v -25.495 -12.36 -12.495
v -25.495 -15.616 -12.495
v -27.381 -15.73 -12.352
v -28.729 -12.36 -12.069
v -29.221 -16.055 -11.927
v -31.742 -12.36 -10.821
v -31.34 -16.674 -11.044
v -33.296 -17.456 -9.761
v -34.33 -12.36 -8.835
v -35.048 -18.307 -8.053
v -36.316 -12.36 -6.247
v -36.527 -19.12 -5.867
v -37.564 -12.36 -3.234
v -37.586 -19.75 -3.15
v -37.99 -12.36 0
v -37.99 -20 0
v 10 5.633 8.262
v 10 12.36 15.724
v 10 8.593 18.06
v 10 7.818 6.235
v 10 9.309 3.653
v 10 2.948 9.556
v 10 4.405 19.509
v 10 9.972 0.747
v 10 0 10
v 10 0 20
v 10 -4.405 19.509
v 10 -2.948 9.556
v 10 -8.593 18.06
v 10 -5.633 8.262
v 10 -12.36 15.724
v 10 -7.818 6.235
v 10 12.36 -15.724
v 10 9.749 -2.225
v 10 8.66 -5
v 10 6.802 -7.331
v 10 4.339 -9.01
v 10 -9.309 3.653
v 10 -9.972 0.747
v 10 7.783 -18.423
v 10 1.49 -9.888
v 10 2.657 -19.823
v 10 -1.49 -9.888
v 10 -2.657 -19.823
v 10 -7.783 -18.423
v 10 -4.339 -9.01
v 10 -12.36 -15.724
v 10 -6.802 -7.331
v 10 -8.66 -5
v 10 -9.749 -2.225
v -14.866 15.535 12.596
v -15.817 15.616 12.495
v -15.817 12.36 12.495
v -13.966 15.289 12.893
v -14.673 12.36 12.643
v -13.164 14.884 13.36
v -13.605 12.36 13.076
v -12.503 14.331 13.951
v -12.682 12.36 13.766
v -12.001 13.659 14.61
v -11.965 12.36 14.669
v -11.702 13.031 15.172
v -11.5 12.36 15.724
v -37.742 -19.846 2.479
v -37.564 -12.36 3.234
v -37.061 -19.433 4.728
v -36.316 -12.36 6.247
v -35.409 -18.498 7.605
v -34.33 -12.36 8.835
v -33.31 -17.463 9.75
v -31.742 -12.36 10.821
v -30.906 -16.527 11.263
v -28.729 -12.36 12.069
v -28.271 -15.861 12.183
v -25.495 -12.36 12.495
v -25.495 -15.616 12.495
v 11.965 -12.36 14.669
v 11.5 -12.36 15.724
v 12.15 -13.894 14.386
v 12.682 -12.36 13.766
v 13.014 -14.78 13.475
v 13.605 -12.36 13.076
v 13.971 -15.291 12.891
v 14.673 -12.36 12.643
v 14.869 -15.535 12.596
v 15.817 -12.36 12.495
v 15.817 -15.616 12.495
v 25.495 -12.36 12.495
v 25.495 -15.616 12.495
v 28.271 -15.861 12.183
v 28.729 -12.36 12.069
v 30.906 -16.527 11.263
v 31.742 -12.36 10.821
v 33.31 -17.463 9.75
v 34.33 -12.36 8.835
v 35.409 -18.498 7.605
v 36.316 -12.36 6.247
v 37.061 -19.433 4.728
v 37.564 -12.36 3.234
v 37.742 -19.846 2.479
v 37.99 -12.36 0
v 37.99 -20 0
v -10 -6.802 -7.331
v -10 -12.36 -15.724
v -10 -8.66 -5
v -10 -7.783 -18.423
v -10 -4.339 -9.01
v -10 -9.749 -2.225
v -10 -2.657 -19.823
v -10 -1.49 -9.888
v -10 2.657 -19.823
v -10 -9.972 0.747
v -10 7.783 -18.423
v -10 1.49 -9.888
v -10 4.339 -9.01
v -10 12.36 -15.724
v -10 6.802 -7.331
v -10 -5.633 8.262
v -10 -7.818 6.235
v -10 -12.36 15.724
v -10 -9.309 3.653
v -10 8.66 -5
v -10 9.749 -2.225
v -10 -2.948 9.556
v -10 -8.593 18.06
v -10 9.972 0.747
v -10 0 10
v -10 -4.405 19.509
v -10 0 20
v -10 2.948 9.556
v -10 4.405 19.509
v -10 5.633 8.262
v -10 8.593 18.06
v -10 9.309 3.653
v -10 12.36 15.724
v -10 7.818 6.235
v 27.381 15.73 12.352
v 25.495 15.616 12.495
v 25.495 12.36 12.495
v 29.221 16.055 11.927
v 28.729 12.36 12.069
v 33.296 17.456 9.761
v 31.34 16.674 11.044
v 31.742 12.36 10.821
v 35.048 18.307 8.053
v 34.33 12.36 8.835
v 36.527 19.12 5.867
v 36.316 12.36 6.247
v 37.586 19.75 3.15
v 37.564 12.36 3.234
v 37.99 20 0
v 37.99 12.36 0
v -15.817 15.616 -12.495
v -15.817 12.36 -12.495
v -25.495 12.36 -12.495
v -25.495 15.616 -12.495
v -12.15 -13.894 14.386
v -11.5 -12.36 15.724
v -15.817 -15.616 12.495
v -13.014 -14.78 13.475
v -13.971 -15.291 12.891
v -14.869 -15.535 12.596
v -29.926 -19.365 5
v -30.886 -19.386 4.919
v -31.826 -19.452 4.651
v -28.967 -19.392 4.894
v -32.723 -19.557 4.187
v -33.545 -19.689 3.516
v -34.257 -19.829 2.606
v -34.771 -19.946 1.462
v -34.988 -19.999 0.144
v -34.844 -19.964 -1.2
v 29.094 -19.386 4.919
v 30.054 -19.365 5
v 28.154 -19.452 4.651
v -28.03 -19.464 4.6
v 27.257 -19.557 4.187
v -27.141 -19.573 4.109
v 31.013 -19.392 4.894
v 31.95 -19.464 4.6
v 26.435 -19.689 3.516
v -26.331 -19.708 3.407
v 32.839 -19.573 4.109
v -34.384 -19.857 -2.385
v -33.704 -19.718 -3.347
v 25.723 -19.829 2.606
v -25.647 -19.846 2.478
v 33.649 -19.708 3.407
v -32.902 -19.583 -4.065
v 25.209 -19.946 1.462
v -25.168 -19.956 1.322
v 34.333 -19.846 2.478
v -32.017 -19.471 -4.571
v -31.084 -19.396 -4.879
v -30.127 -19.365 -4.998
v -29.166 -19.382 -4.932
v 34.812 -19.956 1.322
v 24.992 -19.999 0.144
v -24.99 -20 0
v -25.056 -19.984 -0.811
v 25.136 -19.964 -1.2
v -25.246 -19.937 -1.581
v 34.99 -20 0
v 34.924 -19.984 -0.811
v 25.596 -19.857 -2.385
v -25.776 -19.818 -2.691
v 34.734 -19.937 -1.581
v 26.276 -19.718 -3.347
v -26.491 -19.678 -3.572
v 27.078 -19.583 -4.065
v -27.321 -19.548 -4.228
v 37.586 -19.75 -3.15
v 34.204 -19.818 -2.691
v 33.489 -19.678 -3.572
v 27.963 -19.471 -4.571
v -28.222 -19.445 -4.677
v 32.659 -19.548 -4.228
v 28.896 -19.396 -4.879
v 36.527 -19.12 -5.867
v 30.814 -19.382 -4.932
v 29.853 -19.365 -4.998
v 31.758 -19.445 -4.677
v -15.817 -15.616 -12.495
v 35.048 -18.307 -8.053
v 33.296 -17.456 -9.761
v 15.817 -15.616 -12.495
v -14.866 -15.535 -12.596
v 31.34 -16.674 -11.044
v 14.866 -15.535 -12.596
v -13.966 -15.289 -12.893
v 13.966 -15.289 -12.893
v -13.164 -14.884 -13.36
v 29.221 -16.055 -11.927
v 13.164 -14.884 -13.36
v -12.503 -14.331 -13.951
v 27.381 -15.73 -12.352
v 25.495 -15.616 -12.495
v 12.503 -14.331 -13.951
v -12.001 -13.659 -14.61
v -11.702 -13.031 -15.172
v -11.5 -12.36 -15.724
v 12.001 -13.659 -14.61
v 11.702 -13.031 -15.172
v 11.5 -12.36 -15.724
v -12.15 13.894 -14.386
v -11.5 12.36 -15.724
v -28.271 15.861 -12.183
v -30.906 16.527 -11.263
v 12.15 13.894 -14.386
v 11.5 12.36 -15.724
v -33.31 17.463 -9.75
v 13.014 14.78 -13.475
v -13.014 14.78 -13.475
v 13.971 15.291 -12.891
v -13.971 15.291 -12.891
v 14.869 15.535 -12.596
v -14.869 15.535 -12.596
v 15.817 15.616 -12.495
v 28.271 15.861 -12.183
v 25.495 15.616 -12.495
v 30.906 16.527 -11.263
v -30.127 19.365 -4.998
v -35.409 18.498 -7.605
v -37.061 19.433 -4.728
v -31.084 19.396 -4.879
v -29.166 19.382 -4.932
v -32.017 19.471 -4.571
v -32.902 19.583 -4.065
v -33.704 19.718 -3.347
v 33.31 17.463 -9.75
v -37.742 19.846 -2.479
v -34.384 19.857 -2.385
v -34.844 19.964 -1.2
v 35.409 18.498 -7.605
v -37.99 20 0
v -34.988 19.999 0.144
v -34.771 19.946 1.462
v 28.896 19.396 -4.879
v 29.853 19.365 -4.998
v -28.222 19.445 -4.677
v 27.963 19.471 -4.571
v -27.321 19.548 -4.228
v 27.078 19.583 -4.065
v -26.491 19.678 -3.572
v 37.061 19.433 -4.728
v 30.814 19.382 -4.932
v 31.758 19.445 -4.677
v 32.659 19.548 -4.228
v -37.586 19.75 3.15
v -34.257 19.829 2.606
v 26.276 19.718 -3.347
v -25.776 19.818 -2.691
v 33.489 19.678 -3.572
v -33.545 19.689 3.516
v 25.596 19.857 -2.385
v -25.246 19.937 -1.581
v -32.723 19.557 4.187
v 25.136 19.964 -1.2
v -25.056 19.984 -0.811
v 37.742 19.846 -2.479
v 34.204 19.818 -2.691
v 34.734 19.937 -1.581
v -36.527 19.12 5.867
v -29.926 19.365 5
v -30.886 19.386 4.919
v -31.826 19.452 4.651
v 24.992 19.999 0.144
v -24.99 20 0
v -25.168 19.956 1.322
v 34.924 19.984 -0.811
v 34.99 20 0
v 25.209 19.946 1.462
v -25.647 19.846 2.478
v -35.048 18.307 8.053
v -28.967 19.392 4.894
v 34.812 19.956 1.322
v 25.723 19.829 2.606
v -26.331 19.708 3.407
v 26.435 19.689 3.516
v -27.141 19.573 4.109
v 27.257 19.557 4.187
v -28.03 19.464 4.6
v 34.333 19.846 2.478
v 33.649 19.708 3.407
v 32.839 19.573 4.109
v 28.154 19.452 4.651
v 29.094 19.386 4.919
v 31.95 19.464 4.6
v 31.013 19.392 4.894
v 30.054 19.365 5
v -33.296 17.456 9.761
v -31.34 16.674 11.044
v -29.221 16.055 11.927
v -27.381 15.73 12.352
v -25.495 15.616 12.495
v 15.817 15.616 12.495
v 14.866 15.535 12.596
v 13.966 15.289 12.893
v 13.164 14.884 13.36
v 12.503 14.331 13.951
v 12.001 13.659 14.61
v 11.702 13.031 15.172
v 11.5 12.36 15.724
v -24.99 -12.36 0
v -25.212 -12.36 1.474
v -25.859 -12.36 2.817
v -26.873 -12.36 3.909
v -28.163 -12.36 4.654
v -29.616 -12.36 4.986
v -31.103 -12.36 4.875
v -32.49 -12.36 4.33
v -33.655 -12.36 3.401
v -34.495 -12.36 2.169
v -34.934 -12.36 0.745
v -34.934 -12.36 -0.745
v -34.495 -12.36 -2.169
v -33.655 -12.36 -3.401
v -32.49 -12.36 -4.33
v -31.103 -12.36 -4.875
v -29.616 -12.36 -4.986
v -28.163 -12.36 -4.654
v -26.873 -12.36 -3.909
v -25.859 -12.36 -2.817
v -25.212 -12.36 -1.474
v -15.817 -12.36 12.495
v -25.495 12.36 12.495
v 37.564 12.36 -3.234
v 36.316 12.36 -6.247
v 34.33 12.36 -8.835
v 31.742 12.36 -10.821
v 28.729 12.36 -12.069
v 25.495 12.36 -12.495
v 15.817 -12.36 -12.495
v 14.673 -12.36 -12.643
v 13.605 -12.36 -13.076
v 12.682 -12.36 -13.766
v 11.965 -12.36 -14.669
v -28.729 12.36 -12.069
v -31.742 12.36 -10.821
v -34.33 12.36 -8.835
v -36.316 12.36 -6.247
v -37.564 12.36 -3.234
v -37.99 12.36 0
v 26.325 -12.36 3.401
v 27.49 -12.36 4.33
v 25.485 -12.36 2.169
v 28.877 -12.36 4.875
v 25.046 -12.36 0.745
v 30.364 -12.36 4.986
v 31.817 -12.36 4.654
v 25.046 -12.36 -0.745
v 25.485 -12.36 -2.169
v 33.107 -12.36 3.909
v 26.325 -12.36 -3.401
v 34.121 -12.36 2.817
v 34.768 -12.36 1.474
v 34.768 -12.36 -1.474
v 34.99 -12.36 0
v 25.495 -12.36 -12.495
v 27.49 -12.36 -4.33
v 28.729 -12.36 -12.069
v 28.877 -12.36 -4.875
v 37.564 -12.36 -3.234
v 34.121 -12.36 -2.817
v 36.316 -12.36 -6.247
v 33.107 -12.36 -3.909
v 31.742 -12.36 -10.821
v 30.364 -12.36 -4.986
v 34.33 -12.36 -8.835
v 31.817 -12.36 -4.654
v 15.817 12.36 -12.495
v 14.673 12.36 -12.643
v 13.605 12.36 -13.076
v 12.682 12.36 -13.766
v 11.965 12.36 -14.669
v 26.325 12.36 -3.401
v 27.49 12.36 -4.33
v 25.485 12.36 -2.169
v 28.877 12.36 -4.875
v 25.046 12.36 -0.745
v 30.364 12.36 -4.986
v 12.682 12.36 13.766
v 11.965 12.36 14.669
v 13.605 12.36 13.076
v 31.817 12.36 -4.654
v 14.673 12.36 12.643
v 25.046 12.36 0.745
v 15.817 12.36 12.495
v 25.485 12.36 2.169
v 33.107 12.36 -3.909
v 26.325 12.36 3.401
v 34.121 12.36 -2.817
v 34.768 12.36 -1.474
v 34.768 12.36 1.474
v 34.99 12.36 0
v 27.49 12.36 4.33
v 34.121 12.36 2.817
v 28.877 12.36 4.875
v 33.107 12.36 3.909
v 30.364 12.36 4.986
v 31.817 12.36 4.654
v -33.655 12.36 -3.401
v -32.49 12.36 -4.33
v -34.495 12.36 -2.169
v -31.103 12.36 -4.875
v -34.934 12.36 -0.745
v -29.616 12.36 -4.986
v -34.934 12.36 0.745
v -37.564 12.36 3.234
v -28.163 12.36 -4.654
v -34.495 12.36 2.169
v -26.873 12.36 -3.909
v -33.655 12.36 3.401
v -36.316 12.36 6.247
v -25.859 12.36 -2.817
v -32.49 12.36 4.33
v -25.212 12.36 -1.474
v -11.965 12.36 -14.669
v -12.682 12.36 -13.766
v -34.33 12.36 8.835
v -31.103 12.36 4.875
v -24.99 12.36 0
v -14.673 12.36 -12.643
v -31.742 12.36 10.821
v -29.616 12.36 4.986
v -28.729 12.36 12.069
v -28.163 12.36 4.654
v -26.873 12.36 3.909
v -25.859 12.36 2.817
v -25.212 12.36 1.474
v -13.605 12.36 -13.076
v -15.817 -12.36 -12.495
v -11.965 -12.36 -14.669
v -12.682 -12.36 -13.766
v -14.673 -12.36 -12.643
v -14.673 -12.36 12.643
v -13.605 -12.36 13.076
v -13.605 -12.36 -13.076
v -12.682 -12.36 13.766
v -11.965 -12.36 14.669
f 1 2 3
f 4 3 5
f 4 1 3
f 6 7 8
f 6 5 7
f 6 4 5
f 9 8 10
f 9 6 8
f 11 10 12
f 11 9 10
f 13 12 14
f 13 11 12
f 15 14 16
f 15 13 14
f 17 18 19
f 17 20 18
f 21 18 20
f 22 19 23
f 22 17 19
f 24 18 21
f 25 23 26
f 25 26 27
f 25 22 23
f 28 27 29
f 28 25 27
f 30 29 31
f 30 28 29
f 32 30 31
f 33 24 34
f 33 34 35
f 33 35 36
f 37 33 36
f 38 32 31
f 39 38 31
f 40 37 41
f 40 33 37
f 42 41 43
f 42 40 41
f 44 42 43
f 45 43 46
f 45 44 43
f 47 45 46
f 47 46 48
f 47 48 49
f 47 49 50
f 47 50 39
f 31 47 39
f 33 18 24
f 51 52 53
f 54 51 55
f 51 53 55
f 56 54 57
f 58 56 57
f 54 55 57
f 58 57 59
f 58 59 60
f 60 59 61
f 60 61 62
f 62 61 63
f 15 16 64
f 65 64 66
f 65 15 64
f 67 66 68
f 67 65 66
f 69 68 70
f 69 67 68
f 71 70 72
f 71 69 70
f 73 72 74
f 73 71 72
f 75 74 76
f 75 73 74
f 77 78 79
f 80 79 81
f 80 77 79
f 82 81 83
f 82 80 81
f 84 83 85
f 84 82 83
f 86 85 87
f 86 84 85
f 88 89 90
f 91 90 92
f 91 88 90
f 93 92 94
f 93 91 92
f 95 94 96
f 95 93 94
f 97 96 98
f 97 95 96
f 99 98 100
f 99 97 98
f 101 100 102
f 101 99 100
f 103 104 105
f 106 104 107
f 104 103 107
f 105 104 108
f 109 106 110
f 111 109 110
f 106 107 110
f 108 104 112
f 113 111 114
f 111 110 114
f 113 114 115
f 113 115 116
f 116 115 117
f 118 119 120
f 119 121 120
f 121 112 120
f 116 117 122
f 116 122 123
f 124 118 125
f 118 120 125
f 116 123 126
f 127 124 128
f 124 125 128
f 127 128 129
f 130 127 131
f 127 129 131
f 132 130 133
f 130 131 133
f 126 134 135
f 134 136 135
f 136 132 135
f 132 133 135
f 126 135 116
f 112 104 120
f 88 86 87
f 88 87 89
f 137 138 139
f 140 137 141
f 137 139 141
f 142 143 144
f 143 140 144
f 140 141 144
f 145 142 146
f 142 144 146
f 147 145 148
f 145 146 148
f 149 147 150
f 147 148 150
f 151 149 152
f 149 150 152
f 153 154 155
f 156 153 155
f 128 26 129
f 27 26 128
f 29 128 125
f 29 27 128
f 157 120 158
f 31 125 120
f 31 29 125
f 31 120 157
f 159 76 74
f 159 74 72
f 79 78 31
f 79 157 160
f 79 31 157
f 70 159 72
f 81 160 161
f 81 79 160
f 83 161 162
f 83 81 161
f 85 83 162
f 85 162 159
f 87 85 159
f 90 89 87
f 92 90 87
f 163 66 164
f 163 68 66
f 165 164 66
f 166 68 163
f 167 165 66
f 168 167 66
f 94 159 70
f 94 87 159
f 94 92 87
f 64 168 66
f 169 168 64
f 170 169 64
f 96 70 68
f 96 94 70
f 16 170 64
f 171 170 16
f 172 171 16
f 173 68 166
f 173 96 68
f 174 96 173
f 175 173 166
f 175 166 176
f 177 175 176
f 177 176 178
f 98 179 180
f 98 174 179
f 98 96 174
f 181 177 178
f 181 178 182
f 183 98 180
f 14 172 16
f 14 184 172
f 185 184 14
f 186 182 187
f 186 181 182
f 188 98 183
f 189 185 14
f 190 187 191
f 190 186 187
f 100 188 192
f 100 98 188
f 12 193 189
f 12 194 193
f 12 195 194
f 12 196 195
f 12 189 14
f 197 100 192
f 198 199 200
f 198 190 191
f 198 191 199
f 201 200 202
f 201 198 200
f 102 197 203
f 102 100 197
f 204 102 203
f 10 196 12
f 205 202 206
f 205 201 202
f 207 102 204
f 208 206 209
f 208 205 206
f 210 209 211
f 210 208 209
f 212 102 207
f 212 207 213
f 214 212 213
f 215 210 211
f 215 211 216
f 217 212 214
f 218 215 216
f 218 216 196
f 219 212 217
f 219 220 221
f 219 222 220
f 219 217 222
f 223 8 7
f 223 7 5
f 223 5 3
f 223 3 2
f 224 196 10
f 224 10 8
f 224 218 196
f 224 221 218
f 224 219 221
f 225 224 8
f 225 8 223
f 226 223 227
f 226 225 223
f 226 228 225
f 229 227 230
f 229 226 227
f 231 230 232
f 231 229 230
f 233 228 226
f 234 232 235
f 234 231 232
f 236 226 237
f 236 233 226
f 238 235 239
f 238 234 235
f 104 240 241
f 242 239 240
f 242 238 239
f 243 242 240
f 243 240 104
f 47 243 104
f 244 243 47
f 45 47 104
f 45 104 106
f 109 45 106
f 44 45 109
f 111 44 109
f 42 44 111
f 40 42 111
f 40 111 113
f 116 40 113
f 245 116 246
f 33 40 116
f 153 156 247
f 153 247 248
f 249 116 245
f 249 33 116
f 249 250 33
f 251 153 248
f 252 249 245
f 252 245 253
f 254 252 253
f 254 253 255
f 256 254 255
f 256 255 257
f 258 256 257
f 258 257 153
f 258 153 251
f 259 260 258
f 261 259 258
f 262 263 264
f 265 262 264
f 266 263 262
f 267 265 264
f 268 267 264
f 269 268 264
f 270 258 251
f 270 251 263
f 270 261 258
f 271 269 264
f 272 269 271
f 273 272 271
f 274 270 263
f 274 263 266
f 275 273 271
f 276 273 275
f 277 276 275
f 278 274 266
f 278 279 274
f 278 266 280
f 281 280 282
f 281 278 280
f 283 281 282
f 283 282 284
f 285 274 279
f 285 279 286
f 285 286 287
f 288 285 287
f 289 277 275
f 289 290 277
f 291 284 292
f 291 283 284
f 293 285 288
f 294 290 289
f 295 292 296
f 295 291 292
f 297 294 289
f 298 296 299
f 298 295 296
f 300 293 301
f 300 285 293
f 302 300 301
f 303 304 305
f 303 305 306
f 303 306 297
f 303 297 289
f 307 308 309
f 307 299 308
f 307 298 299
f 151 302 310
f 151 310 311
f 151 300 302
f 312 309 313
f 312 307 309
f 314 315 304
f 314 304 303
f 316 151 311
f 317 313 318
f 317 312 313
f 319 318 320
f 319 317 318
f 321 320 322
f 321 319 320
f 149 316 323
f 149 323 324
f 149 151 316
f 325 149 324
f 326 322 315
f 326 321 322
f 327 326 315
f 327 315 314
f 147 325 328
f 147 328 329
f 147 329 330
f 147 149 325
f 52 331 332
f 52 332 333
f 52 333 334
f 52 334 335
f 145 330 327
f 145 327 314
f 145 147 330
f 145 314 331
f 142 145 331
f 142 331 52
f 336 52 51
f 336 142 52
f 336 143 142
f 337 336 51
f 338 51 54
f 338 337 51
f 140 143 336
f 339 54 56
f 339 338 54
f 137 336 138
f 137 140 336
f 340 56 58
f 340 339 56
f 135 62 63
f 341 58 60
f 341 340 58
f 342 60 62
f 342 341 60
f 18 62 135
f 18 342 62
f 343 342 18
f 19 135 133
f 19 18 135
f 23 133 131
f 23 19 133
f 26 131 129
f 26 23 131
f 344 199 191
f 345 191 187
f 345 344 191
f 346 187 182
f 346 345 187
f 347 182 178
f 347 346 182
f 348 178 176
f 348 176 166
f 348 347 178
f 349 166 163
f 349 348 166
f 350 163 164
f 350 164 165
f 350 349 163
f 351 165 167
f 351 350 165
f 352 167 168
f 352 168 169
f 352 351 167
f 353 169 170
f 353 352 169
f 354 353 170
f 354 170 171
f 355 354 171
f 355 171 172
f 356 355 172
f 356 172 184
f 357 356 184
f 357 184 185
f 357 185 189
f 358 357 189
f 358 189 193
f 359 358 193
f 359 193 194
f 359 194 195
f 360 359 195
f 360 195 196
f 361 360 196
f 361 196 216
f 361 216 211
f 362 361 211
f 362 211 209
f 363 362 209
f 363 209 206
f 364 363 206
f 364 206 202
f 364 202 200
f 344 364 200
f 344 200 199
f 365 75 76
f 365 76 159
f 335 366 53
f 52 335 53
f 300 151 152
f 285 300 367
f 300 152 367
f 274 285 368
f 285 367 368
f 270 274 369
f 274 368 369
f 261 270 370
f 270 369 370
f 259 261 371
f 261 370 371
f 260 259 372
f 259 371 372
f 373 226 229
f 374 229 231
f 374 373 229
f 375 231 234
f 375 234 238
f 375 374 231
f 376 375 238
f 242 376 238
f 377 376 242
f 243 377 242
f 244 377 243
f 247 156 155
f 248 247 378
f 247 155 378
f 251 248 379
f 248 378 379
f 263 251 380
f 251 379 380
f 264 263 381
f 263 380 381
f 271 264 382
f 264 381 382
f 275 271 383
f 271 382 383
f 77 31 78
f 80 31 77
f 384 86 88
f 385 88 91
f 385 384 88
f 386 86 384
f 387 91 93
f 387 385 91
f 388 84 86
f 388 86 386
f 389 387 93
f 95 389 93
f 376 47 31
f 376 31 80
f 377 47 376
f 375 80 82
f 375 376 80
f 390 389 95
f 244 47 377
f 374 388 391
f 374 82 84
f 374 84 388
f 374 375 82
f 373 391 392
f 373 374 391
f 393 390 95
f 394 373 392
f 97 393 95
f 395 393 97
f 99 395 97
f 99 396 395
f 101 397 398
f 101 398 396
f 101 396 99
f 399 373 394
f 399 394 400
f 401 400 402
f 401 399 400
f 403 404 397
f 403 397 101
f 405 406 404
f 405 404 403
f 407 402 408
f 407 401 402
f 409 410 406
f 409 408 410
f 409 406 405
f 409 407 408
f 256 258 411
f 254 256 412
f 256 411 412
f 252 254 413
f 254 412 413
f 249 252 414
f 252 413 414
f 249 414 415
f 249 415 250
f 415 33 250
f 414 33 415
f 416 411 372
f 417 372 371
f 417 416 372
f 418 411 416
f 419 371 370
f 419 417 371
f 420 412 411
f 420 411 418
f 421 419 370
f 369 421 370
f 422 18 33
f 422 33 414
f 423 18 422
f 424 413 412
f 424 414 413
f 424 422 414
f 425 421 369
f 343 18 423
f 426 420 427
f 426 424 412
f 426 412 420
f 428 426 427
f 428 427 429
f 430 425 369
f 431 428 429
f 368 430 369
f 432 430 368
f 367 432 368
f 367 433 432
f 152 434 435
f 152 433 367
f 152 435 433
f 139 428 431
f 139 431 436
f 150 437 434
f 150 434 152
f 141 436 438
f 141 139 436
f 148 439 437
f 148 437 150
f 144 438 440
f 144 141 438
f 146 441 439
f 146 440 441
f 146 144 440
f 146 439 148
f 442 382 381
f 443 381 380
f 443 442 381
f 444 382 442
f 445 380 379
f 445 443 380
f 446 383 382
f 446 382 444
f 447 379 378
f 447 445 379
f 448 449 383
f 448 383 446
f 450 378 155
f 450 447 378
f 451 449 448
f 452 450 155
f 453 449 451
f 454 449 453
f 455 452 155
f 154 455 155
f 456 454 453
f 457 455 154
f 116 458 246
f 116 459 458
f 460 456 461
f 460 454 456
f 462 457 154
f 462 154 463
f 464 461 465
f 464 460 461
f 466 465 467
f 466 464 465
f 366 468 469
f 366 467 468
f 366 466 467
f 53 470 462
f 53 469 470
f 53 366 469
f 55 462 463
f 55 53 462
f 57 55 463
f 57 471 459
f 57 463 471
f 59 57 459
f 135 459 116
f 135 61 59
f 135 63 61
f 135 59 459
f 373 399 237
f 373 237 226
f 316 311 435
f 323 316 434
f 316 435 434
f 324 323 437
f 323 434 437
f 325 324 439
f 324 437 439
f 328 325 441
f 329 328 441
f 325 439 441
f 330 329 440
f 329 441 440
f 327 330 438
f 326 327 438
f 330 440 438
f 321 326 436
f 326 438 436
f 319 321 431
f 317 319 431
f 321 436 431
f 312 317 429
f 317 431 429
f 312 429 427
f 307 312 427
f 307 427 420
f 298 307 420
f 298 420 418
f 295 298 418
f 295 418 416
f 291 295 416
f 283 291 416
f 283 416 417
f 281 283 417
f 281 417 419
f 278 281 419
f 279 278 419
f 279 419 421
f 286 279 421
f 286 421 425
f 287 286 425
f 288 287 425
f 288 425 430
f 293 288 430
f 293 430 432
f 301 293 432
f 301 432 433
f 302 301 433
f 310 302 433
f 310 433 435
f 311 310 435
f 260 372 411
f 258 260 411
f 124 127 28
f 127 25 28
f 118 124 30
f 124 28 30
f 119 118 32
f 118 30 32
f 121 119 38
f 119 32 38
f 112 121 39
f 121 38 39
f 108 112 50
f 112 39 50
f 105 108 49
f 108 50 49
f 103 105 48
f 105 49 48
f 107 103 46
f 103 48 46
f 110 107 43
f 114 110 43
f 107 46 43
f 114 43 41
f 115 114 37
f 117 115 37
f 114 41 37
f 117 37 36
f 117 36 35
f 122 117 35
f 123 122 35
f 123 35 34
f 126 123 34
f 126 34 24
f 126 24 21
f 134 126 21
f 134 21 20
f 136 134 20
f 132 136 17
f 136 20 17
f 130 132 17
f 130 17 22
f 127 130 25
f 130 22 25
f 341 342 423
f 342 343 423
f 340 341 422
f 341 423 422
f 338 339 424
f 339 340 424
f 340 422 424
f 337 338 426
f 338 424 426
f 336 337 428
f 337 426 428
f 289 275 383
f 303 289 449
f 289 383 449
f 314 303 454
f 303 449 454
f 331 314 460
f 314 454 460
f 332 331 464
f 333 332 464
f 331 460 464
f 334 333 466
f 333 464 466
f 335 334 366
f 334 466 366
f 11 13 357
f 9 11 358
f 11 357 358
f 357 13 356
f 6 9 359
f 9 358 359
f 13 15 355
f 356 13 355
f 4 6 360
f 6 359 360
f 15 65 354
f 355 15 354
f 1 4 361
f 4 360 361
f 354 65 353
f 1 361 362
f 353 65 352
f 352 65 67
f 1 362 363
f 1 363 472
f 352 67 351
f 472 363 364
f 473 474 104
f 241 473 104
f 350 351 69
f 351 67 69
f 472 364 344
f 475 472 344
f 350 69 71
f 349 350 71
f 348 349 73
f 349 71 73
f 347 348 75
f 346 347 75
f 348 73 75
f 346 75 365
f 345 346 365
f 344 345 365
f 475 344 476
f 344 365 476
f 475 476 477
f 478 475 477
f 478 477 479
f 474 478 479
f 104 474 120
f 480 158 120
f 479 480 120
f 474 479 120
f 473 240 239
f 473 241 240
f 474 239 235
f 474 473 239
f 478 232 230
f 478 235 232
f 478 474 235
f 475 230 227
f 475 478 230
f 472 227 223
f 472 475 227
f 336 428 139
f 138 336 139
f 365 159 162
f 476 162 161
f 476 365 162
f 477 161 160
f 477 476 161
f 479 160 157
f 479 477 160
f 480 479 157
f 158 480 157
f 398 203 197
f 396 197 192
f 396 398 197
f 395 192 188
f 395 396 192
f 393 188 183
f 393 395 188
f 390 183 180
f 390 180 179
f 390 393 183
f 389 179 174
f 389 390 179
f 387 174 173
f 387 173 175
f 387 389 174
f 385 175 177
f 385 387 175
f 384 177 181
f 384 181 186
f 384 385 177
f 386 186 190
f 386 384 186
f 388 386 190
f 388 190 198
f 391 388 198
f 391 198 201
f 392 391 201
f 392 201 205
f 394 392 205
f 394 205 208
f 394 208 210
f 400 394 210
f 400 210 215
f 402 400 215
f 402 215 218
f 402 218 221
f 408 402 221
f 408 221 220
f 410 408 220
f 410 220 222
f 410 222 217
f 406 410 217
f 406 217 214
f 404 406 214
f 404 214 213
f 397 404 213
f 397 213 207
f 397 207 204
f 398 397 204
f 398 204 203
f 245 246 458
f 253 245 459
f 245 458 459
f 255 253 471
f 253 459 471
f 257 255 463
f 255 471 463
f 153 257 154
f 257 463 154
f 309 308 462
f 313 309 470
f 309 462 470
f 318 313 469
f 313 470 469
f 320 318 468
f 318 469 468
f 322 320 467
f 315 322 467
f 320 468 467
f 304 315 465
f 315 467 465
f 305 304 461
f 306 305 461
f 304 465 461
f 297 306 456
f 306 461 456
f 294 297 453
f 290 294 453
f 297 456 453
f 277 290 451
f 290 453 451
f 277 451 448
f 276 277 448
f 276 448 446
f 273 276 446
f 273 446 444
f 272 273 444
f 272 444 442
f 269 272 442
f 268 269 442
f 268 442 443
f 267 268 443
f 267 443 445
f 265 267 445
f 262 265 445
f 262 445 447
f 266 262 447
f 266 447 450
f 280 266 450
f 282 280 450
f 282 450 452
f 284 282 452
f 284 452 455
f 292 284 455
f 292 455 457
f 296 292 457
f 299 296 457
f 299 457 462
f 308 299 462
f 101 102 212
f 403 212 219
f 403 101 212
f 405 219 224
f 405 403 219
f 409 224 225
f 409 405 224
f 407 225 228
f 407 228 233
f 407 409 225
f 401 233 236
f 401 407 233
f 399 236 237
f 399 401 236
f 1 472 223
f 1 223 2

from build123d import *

# Parameters (mm, degrees)
F0_W          = 75.98
F0_H          = 10
F2_W          = 27.99
F2_H          = 12.36
F3_DEPTH      = 20.001
F3_DEPTH_BACK = 20.001
F4_R          = 5
F5_DEPTH      = 20.001
F5_DEPTH_BACK = 20.001


with BuildPart() as f1:
    # F0 (on Front) → F1 (revolve)
    with BuildSketch(Plane.XZ):
        with Locations((0, 15)):
            Rectangle(F0_W, F0_H)
    revolve(axis=Axis((-1.2122914195, 0, 0), (1, 0, 0)))

    # F2 (on Top) → F3 (cut, two sides)
    with BuildSketch(Plane.XY) as f3_sk:
        with Locations((23.995, 6.18)):
            Rectangle(F2_W, F2_H)
        with Locations((23.995, -6.18)):
            Rectangle(F2_W, F2_H)
        with Locations((-23.995, 6.18)):
            Rectangle(F2_W, F2_H)
        with Locations((-23.995, -6.18)):
            Rectangle(F2_W, F2_H)
    extrude(amount=-F3_DEPTH, mode=Mode.SUBTRACT)
    extrude(f3_sk.sketch, amount=F3_DEPTH_BACK, mode=Mode.SUBTRACT)

    # F4 (on Front) → F5 (cut, two sides)
    with BuildSketch(Plane.XZ) as f5_sk:
        with BuildLine():
            Line((-37.99, 15.7235619374), (-37.99, 0))
            ThreePointArc((-37.99, 0), (-34.3302992309, 8.8352992309), (-25.495, 12.495))
            Line((-25.495, 12.495), (-15.8166474553, 12.495))
            ThreePointArc((-15.8166474553, 12.495), (-13.1214175283, 13.3914273782), (-11.5, 15.7235619374))
            Line((-11.5, 15.7235619374), (-37.99, 15.7235619374))
        make_face()
        with BuildLine():
            ThreePointArc((-25.495, -12.495), (-34.3302992309, -8.8352992309), (-37.99, 0))
            Line((-37.99, 0), (-37.99, -15.8999282867))
            Line((-37.99, -15.8999282867), (-11.5, -15.7235619374))
            ThreePointArc((-11.5, -15.7235619374), (-13.1214175283, -13.3914273782), (-15.8166474553, -12.495))
            Line((-15.8166474553, -12.495), (-25.495, -12.495))
        make_face()
        with Locations((-29.99, 0)):
            Circle(F4_R)
        with Locations((29.99, 0)):
            Circle(F4_R)
        with BuildLine():
            Line((37.99, -15.8999282867), (37.99, 0))
            ThreePointArc((37.99, 0), (34.3302992309, -8.8352992309), (25.495, -12.495))
            Line((25.495, -12.495), (15.8166474553, -12.495))
            ThreePointArc((15.8166474553, -12.495), (13.1214175283, -13.3914273782), (11.5, -15.7235619374))
            Line((11.5, -15.7235619374), (37.99, -15.8999282867))
        make_face()
        with BuildLine():
            Line((37.99, 15.7235619374), (11.5, 15.7235619374))
            ThreePointArc((11.5, 15.7235619374), (13.1214175283, 13.3914273782), (15.8166474553, 12.495))
            Line((15.8166474553, 12.495), (25.495, 12.495))
            ThreePointArc((25.495, 12.495), (34.3302992309, 8.8352992309), (37.99, 0))
            Line((37.99, 0), (37.99, 15.7235619374))
        make_face()
    extrude(amount=-F5_DEPTH, mode=Mode.SUBTRACT)
    extrude(f5_sk.sketch, amount=F5_DEPTH_BACK, mode=Mode.SUBTRACT)


solid = f1.part
